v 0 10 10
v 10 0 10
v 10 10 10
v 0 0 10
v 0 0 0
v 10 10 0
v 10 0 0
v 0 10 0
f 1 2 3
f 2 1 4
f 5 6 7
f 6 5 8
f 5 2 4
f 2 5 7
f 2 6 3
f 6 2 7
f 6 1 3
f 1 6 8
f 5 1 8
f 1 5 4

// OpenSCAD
// Generated by SolidPython 1.1.3 on 2023-05-28 11:20:11


cube(size = 10);
/***********************************************
*********      SolidPython code:      **********
************************************************
 
from solid import *
from solid.utils import *
import pathlib


def main():
    c = cube(10)
    file_path = pathlib.Path(__file__).parent / 'sp01_create_cube.scad'
    scad_render_to_file(c, file_path)


if __name__ == '__main__':
    main()
 
 
************************************************/
